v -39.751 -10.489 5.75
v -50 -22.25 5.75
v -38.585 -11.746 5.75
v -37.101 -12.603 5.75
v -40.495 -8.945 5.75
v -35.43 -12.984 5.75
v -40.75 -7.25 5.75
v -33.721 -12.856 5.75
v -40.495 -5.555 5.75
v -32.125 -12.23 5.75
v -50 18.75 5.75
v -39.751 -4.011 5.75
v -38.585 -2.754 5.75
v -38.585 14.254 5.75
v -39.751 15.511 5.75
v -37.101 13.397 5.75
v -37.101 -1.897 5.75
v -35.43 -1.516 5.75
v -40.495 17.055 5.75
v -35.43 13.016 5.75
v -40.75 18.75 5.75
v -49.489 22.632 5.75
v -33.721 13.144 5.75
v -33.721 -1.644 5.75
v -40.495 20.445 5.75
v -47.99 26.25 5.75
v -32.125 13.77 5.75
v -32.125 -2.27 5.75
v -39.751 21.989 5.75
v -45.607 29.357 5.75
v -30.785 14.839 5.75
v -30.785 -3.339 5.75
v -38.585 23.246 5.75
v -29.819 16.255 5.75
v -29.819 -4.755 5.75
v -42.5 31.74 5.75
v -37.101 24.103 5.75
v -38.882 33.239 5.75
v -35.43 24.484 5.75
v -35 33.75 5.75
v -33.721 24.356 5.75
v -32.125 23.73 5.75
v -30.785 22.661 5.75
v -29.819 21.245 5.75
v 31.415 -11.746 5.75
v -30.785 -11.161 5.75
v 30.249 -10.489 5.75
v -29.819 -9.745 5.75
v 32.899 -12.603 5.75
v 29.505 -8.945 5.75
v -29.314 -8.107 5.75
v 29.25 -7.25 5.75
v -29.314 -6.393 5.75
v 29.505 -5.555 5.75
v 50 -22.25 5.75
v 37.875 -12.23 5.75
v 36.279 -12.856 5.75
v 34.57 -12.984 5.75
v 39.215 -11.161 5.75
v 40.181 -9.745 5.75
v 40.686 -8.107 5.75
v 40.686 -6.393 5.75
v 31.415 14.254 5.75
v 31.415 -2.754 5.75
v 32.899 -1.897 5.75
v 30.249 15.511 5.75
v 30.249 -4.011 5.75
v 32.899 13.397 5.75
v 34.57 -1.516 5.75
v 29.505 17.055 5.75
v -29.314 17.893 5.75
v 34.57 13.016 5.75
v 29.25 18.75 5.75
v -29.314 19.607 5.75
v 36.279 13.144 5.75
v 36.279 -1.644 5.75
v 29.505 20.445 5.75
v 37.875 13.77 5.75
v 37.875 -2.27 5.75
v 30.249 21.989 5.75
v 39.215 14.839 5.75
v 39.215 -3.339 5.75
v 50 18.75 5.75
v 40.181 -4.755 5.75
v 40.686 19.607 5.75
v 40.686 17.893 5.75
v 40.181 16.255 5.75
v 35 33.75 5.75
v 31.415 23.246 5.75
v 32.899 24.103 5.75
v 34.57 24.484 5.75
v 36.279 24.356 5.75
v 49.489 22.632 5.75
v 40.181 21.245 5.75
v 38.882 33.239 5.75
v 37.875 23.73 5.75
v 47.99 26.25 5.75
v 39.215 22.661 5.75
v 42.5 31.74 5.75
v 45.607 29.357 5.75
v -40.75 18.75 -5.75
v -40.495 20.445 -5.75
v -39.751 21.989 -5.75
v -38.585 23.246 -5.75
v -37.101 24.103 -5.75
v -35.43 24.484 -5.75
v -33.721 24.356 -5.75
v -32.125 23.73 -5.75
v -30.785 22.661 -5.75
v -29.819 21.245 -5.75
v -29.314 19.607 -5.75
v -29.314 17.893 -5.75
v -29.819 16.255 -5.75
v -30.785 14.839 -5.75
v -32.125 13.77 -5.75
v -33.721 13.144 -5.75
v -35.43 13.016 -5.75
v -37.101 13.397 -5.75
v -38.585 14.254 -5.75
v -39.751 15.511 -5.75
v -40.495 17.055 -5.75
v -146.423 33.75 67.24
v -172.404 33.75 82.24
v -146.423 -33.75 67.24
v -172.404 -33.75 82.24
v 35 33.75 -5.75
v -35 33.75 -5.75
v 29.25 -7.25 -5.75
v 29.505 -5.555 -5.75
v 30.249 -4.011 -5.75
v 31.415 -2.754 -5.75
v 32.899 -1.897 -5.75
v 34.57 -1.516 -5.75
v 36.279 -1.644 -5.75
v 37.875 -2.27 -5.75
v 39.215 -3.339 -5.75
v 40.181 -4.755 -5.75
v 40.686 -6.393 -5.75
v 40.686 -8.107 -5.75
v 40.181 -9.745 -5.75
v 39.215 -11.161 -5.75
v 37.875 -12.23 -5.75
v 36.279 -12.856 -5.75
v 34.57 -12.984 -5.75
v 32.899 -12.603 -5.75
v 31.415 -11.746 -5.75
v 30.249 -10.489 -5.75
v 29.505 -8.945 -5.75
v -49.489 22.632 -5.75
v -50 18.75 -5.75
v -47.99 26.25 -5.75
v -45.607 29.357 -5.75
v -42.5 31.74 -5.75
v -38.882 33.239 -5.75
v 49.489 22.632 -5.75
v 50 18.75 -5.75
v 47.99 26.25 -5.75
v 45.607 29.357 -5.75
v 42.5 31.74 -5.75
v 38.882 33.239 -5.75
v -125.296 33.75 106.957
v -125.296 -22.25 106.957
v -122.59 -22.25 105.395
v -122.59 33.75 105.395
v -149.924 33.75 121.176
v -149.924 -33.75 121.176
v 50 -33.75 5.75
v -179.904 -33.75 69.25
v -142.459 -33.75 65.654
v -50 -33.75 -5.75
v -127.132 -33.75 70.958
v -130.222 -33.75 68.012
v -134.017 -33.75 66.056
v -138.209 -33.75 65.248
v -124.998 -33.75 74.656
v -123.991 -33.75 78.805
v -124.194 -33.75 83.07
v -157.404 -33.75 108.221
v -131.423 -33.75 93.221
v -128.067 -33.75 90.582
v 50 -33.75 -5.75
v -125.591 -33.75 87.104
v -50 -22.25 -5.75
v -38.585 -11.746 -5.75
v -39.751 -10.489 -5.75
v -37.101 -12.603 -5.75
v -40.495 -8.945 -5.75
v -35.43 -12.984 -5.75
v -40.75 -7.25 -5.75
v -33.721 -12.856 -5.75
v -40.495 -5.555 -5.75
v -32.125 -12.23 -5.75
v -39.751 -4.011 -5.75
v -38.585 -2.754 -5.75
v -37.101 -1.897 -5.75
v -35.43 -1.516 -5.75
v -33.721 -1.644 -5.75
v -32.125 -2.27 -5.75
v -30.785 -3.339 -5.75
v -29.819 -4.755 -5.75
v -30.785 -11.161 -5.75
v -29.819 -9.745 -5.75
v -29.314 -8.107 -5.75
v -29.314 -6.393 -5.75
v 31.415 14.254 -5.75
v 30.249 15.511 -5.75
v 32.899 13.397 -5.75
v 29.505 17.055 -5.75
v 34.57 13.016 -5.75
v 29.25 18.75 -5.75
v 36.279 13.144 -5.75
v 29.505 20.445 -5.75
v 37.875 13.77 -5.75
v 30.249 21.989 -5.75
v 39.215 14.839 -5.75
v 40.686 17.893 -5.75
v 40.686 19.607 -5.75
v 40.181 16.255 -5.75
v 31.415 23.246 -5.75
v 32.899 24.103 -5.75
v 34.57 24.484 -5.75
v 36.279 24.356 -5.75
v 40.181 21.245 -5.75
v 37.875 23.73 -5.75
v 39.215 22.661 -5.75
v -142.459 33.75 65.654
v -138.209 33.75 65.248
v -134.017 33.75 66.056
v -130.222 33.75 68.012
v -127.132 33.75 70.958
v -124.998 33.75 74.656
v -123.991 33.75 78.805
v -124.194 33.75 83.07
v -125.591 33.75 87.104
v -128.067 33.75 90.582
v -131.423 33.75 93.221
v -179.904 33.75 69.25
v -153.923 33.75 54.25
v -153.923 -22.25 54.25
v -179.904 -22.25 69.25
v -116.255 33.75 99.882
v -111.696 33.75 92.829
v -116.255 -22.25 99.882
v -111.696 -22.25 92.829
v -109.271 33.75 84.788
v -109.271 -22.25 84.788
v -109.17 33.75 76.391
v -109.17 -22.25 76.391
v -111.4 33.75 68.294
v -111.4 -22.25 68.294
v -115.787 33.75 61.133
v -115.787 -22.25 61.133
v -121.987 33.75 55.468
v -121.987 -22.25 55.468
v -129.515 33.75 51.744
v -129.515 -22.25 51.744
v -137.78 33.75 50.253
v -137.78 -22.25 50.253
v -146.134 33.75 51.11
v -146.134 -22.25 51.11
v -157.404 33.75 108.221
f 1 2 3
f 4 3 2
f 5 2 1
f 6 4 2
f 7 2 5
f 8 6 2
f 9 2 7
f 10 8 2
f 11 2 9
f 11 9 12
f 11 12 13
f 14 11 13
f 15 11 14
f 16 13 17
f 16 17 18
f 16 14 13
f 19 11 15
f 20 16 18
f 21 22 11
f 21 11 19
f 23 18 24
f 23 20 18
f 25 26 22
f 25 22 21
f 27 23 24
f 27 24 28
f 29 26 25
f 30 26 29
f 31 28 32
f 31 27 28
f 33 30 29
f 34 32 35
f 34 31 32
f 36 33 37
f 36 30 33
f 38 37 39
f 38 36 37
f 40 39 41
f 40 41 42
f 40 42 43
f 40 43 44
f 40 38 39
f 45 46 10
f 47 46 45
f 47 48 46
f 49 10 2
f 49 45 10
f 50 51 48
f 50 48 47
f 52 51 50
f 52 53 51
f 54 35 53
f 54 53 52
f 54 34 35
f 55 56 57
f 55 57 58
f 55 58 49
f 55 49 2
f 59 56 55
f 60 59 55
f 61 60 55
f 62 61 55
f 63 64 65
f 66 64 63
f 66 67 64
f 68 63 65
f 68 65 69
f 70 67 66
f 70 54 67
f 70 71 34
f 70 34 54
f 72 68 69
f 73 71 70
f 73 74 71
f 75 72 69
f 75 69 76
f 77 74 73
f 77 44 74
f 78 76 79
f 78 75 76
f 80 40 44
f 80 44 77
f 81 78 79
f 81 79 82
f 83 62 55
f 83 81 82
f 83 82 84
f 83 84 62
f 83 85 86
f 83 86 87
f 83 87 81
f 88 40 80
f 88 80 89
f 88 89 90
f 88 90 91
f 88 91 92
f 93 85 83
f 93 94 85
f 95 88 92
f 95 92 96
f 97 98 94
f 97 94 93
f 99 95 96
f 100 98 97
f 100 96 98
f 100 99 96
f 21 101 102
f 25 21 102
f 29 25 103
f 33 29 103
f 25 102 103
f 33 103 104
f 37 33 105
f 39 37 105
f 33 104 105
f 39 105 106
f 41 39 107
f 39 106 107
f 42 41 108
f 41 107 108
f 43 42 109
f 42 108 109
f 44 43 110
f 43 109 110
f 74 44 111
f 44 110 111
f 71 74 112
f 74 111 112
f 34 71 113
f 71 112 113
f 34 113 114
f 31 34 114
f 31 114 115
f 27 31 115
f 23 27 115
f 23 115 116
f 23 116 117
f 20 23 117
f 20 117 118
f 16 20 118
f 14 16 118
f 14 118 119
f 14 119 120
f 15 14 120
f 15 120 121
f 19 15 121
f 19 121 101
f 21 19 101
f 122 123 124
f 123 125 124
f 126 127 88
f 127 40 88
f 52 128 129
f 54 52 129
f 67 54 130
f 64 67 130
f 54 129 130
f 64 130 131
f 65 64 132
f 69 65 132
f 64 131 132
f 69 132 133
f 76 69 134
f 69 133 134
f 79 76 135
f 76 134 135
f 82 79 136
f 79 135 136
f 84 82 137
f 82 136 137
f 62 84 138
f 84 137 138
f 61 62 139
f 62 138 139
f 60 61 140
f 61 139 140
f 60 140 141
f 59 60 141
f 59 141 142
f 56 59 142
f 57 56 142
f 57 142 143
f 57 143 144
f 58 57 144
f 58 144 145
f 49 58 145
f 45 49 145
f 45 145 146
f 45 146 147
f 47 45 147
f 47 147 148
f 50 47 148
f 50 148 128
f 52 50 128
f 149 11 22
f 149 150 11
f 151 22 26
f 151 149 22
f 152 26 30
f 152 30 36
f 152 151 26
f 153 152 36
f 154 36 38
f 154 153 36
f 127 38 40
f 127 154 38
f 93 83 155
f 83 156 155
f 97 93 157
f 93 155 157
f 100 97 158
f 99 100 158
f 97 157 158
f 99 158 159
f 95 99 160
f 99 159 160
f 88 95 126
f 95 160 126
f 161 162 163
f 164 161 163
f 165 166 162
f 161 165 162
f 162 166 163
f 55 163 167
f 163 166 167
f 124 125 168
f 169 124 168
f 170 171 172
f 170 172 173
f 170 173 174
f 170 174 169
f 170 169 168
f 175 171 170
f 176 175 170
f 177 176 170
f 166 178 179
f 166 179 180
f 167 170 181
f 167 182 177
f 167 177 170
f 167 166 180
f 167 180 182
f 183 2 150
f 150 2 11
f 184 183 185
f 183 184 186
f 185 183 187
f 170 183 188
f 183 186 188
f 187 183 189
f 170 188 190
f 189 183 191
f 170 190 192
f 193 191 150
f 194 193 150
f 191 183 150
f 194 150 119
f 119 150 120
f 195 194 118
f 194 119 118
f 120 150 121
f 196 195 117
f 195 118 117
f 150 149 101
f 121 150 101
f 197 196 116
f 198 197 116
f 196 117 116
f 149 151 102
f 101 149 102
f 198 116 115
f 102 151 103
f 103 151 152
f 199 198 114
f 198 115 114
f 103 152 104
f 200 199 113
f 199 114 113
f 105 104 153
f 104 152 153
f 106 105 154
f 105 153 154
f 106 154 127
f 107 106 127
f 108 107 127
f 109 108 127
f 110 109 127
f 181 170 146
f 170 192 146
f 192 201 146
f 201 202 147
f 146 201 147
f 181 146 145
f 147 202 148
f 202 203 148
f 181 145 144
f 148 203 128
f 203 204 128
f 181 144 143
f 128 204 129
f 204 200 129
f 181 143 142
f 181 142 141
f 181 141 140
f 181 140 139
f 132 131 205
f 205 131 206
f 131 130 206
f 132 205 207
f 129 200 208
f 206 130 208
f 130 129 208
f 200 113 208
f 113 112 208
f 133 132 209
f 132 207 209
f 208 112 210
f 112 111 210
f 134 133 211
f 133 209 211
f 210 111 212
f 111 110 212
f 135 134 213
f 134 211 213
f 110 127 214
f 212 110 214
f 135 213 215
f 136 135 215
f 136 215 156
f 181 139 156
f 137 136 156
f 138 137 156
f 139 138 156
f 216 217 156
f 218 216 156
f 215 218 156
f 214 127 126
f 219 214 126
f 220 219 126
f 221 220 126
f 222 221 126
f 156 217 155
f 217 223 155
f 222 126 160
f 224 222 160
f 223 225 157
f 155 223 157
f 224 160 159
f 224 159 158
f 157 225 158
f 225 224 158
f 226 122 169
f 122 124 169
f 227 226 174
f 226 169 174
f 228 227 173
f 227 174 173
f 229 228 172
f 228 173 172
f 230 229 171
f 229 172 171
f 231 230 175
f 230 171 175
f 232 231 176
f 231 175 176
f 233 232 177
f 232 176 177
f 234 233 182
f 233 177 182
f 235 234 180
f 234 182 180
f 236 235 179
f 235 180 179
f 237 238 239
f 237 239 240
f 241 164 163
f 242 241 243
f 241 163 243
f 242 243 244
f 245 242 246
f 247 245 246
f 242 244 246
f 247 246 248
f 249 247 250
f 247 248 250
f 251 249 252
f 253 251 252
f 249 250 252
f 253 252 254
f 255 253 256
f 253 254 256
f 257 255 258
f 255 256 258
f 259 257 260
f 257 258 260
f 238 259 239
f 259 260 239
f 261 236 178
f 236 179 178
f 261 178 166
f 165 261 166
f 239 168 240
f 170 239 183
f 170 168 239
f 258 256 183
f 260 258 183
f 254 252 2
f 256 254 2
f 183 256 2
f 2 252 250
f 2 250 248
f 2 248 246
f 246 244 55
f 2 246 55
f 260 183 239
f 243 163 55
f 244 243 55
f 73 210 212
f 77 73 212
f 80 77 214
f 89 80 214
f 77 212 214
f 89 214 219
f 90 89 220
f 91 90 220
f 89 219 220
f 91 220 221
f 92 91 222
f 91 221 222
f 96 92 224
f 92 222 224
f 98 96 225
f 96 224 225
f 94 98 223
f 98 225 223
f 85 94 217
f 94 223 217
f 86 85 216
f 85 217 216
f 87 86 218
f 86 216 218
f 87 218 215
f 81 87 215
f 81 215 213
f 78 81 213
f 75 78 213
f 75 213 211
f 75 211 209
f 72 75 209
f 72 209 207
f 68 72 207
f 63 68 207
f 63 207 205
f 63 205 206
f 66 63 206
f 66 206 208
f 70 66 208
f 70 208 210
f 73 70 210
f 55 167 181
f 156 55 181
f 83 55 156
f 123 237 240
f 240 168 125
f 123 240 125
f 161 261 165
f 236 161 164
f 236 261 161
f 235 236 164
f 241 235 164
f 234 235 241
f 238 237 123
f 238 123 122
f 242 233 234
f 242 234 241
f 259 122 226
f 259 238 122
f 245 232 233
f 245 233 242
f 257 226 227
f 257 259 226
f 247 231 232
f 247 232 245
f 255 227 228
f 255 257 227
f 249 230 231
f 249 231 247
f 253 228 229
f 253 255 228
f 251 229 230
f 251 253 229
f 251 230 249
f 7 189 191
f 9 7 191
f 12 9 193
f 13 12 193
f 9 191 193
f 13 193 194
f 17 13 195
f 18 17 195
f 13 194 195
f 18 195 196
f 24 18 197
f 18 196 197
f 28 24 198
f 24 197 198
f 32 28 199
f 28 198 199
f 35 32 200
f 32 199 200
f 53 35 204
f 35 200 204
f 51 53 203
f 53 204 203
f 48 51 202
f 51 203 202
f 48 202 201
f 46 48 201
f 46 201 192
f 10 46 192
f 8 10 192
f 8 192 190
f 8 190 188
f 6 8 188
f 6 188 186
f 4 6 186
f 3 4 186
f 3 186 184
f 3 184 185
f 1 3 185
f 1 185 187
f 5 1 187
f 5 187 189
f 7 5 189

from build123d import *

# Parameters (mm, degrees)
SKETCH_1_W                = 100
SKETCH_1_H                = 67.5
EXTRUDE_1_DEPTH           = 5.75
FILLET_1_R                = 15
HOLE_WIZARD_11_5_11_5_1_D = 11.5
EXTRUDE_2_DEPTH           = 11.5
EXTRUDE_3_DEPTH           = 56


with BuildPart() as part:
    # 草图1 → 凸台-拉伸1 (new, symmetric)
    with BuildSketch(Plane.XY):
        Rectangle(SKETCH_1_W, SKETCH_1_H)
    extrude(amount=EXTRUDE_1_DEPTH, both=True)

    # 圆角1
    fillet_1_edges = [part.edges().sort_by_distance(p)[0] for p in [
        (-50, 33.75, 0),
        (50, 33.75, 0),
    ]]
    fillet(fillet_1_edges, radius=FILLET_1_R)

    # Ø11.5 (11.5) 直径孔1 (through all)
    with Locations(Plane.XY.offset(5.75)):
        with Locations((-35, 18.75), (35, 18.75), (-35, -7.25), (35, -7.25)):
            Hole(HOLE_WIZARD_11_5_11_5_1_D / 2)

    # 草图5 → 凸台-拉伸2 (add)
    with BuildSketch(Plane.XZ.offset(33.75)):
        with BuildLine():
            Line((-179.903810568, 69.25), (-50, -5.75))
            Line((-50, -5.75), (-50, 5.75))
            Line((-50, 5.75), (50, 5.75))
            Line((50, 5.75), (-149.924164496, 121.176270189))
            Line((-149.924164496, 121.176270189), (-157.403810568, 108.22114317))
            Line((-157.403810568, 108.22114317), (-131.423048454, 93.22114317))
            ThreePointArc((-131.423048454, 93.22114317), (-125.932667397, 72.730762114), (-146.423048454, 67.240381057))
            Line((-146.423048454, 67.240381057), (-172.403810568, 82.240381057))
            Line((-172.403810568, 82.240381057), (-179.903810568, 69.25))
        make_face()
    extrude(amount=-EXTRUDE_2_DEPTH)

    # 草图6 → 凸台-拉伸3 (add)
    with BuildSketch(Plane(origin=(0, -22.25, 0), x_dir=(1, 0, 0), z_dir=(0, 1, 0))):
        with BuildLine():
            Line((-125.296403009, -106.957425465), (-122.590401756, -105.395114913))
            ThreePointArc((-122.590401756, -105.395114913), (-113.341811547, -64.559121538), (-153.923048454, -54.25))
            Line((-153.923048454, -54.25), (-179.903810568, -69.25))
            Line((-179.903810568, -69.25), (-172.403810568, -82.240381057))
            Line((-172.403810568, -82.240381057), (-146.423048454, -67.240381057))
            ThreePointArc((-146.423048454, -67.240381057), (-125.932667397, -72.730762114), (-131.423048454, -93.22114317))
            Line((-131.423048454, -93.22114317), (-157.403810568, -108.22114317))
            Line((-157.403810568, -108.22114317), (-149.924164496, -121.176270189))
            Line((-149.924164496, -121.176270189), (-125.296403009, -106.957425465))
        make_face()
    extrude(amount=EXTRUDE_3_DEPTH)


solid = part.part
